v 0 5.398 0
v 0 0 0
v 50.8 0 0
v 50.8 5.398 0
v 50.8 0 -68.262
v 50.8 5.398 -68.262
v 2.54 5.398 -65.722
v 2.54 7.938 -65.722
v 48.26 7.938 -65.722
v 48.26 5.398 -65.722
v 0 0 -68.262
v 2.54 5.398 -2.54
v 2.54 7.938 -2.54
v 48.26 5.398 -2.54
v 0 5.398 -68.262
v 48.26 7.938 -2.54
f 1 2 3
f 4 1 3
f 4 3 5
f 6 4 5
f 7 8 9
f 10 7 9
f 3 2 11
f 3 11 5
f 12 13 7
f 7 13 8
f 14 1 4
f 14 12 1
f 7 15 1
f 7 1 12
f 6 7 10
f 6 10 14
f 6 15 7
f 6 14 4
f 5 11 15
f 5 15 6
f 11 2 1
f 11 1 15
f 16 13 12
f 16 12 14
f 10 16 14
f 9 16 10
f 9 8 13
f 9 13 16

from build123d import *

# Parameters (mm, degrees)
SKETCH1_W           = 50.8
SKETCH1_H           = 68.2625
BOSS_EXTRUDE1_DEPTH = 7.9375
SKETCH2_W           = 50.8
SKETCH2_H           = 68.2625
SKETCH2_W_2         = 45.72
SKETCH2_H_2         = 63.1825
CUT_EXTRUDE1_DEPTH  = 2.54


with BuildPart() as part:
    # Sketch1 → Boss-Extrude1 (new body)
    with BuildSketch(Plane(origin=(0, 0, 0), x_dir=(1, 0, 0), z_dir=(0, 1, 0))):
        with Locations((25.4, 34.13125)):
            Rectangle(SKETCH1_W, SKETCH1_H)
    extrude(amount=BOSS_EXTRUDE1_DEPTH)

    # Sketch2 → Cut-Extrude1 (cut)
    with BuildSketch(Plane(origin=(0, 7.9375, 0), x_dir=(1, 0, 0), z_dir=(0, 1, 0))):
        with Locations((25.4, 34.13125)):
            Rectangle(SKETCH2_W, SKETCH2_H)
        with Locations((25.4, 34.13125)):
            Rectangle(SKETCH2_W_2, SKETCH2_H_2, mode=Mode.SUBTRACT)
    extrude(amount=-CUT_EXTRUDE1_DEPTH, mode=Mode.SUBTRACT)


solid = part.part
